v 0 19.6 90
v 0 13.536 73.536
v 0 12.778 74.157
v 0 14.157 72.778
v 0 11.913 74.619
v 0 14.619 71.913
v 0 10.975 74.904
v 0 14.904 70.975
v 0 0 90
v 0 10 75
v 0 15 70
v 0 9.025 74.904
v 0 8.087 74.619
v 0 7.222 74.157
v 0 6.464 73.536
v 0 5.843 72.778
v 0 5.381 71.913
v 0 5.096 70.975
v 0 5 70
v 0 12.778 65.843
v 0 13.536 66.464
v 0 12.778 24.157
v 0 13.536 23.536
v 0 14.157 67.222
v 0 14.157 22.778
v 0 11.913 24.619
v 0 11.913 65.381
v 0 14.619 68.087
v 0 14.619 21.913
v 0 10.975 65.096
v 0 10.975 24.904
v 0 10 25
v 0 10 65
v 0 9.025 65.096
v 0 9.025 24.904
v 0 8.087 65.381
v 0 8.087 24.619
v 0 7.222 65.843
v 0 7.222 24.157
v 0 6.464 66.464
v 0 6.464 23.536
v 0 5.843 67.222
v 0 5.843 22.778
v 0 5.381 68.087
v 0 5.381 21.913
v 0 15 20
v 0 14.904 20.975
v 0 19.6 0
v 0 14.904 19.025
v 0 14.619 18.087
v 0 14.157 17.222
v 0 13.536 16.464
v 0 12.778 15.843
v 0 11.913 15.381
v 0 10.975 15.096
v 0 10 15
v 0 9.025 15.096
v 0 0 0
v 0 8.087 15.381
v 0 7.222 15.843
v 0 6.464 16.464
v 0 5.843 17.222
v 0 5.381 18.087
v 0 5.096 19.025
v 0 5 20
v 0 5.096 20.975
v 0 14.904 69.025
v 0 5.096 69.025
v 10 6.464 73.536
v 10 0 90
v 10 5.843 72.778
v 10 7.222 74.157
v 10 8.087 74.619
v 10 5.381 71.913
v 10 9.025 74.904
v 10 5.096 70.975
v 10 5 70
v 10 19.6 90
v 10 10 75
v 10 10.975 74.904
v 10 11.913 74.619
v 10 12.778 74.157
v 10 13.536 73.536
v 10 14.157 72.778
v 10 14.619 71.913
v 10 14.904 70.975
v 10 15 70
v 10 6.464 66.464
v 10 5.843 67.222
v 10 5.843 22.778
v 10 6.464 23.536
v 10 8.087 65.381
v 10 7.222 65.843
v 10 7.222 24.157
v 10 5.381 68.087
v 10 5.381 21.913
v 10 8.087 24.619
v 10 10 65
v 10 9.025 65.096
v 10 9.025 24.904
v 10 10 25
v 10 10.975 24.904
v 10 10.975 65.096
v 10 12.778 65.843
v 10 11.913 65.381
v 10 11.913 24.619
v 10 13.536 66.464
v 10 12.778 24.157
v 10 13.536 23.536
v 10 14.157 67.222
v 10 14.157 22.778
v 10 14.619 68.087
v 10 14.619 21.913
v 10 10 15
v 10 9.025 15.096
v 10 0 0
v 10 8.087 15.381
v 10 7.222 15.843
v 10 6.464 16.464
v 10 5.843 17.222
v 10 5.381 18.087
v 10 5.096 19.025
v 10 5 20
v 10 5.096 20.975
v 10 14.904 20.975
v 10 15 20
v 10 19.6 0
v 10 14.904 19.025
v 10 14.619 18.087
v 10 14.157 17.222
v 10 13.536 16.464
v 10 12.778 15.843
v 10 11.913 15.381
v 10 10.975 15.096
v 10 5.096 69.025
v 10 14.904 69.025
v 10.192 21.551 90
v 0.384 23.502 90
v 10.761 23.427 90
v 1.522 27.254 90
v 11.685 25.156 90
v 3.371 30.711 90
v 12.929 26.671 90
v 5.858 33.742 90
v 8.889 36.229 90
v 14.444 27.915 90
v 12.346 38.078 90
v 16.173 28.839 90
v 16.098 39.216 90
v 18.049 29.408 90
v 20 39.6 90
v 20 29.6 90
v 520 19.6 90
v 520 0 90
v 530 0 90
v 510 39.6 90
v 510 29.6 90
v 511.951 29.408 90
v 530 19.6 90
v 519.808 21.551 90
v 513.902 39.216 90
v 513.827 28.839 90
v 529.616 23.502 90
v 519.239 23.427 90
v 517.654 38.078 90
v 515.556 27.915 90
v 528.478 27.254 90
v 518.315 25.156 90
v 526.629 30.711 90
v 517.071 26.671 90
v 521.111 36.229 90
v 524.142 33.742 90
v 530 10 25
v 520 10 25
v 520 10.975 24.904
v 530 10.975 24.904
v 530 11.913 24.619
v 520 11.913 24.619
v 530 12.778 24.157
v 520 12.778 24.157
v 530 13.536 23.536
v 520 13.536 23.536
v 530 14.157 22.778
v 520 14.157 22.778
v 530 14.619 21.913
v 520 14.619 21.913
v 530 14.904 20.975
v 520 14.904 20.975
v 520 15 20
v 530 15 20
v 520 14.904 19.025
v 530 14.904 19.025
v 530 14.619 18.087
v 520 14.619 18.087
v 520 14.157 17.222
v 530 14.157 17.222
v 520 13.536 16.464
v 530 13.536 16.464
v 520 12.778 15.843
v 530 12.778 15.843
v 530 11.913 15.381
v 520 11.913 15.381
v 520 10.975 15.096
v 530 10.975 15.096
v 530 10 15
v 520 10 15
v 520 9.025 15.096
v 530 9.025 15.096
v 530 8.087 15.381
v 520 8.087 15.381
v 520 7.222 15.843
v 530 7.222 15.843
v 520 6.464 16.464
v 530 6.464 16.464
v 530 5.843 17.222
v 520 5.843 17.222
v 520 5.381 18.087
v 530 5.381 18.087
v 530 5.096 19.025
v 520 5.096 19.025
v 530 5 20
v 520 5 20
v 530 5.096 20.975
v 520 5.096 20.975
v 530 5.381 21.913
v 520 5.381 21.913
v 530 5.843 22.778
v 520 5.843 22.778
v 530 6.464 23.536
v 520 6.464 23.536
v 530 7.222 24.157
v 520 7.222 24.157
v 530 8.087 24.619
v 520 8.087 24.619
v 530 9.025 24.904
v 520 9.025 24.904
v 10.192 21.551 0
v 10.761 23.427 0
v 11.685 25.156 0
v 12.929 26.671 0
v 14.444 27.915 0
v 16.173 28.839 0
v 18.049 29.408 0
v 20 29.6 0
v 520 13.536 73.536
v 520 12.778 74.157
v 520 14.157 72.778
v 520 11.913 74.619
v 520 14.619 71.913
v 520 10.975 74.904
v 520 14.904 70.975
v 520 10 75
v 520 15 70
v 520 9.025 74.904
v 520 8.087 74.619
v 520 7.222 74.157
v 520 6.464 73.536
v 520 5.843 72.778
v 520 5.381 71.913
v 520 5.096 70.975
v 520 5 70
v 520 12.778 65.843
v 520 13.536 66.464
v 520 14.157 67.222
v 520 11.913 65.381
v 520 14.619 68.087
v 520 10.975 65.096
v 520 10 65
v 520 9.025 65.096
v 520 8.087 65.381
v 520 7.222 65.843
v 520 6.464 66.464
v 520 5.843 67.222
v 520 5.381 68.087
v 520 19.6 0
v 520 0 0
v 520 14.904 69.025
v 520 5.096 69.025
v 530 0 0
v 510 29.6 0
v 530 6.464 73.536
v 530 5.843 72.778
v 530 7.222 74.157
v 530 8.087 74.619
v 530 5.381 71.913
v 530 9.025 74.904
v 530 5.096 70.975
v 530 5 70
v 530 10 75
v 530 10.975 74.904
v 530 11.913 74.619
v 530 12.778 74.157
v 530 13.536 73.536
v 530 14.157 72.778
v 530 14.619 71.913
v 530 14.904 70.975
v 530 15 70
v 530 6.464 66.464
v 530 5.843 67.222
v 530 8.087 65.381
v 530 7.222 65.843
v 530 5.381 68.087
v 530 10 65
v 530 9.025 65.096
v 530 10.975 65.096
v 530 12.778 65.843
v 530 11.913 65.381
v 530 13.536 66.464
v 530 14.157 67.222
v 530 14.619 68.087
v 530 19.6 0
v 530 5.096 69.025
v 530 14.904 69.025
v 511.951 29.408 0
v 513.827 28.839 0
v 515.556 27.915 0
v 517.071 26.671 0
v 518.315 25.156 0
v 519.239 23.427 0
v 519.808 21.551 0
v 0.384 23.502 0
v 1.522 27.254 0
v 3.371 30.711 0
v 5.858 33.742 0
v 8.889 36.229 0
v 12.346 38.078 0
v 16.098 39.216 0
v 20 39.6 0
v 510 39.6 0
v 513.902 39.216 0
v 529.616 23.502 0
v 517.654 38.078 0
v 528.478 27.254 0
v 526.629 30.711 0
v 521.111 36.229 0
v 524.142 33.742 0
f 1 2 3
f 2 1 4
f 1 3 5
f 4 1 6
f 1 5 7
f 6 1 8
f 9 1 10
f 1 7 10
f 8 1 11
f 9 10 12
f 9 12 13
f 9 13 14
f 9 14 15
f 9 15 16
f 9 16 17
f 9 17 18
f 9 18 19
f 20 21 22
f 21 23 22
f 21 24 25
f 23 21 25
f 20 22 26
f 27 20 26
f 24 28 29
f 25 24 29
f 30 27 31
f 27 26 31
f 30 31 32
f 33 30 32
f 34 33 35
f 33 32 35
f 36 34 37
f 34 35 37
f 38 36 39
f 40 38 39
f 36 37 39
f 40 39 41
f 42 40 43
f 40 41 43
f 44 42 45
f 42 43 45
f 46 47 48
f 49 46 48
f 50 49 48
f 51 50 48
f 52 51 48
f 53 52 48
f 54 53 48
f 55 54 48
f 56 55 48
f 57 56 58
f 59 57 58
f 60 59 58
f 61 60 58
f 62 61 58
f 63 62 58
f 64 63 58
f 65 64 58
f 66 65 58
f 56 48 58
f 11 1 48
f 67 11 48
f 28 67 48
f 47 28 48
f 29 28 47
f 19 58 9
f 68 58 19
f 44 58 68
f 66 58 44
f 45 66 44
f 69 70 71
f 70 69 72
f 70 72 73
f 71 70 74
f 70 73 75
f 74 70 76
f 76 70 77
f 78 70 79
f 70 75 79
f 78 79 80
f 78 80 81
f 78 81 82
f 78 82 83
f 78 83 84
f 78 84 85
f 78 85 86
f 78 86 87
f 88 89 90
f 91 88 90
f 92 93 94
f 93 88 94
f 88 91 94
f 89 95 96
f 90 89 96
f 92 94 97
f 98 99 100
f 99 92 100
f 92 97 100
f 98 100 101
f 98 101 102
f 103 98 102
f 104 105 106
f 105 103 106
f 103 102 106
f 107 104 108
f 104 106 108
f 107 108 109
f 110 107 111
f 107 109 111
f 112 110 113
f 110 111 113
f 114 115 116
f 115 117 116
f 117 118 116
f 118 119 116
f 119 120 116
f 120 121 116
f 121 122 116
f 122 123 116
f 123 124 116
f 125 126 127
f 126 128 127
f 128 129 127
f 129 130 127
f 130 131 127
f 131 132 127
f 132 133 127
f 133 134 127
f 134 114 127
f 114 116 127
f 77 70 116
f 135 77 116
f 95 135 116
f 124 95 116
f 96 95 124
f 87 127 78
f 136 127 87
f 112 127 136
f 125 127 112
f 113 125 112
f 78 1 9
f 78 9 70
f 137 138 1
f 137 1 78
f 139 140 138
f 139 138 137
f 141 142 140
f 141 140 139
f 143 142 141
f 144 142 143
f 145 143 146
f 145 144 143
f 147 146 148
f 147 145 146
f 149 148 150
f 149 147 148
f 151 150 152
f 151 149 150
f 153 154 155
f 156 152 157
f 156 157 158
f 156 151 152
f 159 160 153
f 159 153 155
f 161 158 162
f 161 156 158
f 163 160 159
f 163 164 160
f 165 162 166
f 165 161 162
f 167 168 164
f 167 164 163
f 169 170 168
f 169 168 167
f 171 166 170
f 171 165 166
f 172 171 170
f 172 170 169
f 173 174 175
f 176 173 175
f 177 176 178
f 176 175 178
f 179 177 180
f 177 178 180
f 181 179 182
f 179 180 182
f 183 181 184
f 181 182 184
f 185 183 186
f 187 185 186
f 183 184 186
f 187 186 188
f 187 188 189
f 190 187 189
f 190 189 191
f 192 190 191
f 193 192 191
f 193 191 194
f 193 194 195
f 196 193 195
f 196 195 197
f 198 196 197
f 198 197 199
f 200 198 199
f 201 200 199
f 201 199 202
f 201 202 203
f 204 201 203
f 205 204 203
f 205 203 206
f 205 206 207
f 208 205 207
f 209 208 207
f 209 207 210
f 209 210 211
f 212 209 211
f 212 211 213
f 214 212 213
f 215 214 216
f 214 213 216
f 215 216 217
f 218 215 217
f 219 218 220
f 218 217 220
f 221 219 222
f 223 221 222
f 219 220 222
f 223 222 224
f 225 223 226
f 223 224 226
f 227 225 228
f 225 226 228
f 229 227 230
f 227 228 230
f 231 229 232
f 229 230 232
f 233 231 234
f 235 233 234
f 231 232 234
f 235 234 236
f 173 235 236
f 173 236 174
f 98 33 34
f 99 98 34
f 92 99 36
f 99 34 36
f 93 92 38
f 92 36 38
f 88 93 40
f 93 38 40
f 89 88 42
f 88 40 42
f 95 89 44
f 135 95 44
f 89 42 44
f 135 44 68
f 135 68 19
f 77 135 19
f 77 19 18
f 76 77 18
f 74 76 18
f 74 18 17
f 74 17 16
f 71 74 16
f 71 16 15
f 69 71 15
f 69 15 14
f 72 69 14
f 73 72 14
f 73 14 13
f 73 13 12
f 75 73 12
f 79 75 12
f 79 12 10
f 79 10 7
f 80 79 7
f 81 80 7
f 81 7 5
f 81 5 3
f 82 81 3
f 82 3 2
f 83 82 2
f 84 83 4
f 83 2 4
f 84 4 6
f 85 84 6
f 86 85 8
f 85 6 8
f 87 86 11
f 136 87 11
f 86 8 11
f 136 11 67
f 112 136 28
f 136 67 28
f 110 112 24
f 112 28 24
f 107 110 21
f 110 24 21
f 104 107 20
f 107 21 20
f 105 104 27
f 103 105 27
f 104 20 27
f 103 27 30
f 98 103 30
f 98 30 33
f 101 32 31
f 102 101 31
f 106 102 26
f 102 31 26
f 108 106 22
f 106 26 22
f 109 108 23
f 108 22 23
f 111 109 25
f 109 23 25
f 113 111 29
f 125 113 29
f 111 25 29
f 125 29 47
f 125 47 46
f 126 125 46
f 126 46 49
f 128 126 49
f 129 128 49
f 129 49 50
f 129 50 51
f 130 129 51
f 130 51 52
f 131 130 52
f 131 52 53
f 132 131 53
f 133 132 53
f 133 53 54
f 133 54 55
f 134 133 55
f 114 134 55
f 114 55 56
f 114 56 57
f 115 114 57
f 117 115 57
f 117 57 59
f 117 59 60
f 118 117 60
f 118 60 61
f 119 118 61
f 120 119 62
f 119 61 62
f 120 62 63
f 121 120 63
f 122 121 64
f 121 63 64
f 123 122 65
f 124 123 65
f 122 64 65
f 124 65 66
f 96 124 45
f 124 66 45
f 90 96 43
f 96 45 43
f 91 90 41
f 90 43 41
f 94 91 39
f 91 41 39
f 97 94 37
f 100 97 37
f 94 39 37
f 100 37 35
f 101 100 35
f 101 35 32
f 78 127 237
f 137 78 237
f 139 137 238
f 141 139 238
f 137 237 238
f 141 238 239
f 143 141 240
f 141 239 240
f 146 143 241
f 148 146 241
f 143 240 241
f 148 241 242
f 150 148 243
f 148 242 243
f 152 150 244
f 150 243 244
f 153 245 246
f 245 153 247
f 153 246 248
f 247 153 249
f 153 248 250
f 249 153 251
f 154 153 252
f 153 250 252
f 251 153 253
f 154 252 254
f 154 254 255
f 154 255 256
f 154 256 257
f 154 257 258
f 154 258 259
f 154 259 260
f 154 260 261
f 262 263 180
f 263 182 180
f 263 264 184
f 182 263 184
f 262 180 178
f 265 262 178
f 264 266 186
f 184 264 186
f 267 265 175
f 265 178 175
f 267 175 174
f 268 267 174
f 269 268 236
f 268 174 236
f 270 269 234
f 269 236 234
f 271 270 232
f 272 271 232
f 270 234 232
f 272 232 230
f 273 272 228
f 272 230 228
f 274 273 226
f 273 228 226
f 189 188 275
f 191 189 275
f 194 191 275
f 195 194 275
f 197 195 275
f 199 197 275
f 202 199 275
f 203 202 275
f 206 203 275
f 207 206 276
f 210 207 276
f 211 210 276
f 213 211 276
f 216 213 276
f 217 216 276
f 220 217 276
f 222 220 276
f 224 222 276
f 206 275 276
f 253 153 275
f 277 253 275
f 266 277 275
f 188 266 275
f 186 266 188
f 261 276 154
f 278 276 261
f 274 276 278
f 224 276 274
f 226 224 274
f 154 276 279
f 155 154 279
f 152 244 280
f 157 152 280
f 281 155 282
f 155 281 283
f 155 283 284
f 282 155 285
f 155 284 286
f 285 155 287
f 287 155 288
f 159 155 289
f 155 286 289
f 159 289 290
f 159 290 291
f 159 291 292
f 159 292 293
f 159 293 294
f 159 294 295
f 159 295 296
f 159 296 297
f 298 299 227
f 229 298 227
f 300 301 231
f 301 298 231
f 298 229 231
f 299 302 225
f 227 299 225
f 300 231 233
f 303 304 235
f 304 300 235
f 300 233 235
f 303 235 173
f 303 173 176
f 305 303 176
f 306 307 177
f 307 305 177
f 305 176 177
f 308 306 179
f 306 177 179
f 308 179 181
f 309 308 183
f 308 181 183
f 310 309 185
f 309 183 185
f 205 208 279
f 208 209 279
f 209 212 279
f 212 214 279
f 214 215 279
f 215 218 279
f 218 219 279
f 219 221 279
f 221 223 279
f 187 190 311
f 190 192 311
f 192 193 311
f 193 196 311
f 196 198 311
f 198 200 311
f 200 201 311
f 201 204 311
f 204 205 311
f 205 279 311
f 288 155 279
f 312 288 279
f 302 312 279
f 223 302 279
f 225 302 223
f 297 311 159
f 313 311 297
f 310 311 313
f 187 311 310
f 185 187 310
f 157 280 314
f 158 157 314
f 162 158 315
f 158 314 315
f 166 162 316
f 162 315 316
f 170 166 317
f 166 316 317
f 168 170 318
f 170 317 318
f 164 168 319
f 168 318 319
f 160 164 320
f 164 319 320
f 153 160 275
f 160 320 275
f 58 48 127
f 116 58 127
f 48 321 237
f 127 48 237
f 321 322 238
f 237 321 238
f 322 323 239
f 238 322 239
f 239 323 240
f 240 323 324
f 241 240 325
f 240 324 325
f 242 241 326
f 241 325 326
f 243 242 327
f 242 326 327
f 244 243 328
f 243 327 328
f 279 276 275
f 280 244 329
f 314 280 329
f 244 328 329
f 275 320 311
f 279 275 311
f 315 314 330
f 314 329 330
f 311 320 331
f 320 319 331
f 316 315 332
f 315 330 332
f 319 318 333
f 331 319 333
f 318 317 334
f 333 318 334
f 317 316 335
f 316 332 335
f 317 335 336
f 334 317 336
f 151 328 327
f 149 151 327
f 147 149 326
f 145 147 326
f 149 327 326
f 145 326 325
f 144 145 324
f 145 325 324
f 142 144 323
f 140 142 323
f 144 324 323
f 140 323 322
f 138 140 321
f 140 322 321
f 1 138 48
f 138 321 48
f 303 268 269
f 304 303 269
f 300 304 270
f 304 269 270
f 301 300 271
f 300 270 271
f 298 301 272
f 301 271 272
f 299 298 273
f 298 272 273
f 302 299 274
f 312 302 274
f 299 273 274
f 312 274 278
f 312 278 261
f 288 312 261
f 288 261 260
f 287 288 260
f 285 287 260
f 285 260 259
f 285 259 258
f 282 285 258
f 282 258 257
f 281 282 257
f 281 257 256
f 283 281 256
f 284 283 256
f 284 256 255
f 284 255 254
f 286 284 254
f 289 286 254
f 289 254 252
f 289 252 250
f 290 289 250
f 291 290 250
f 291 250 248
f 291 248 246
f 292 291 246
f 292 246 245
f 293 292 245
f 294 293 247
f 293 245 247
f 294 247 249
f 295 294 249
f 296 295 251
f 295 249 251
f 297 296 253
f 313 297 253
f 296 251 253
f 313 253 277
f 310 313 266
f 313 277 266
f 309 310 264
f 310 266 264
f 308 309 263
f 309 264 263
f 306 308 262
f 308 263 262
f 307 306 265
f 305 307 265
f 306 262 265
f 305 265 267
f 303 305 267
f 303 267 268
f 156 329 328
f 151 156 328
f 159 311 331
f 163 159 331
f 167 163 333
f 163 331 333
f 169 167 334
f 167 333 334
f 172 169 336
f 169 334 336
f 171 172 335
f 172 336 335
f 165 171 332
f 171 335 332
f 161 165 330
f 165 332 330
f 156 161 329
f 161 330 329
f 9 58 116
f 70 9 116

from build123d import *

# Parameters (mm, degrees)
BOSS_EXTRUDE2_DEPTH = 90
SKETCH2_R           = 5
CUT_EXTRUDE1_DEPTH  = 540.043745906


with BuildPart() as part:
    # Sketch1 → Boss-Extrude2 (new body)
    with BuildSketch(Plane.XY):
        with BuildLine():
            Line((20, 29.6), (510, 29.6))
            ThreePointArc((510, 29.6), (517.071067812, 26.671067812), (520, 19.6))
            Line((520, 19.6), (520, 0))
            Line((520, 0), (530, 0))
            Line((530, 0), (530, 19.6))
            ThreePointArc((530, 19.6), (524.142135624, 33.742135624), (510, 39.6))
            Line((510, 39.6), (20, 39.6))
            ThreePointArc((20, 39.6), (5.857864376, 33.742135624), (0, 19.6))
            Line((0, 19.6), (0, 0))
            Line((0, 0), (10, 0))
            Line((10, 0), (10, 19.6))
            ThreePointArc((10, 19.6), (12.928932188, 26.671067812), (20, 29.6))
        make_face()
    extrude(amount=BOSS_EXTRUDE2_DEPTH)

    # Sketch2 → Cut-Extrude1 (cut, through all)
    with BuildSketch(Plane.ZY):
        with Locations((20, 10)):
            Circle(SKETCH2_R)
        with Locations(Location((70, 10, 0), (0, 0, 180))):
            Circle(SKETCH2_R)
    extrude(amount=-CUT_EXTRUDE1_DEPTH, mode=Mode.SUBTRACT)


solid = part.part
